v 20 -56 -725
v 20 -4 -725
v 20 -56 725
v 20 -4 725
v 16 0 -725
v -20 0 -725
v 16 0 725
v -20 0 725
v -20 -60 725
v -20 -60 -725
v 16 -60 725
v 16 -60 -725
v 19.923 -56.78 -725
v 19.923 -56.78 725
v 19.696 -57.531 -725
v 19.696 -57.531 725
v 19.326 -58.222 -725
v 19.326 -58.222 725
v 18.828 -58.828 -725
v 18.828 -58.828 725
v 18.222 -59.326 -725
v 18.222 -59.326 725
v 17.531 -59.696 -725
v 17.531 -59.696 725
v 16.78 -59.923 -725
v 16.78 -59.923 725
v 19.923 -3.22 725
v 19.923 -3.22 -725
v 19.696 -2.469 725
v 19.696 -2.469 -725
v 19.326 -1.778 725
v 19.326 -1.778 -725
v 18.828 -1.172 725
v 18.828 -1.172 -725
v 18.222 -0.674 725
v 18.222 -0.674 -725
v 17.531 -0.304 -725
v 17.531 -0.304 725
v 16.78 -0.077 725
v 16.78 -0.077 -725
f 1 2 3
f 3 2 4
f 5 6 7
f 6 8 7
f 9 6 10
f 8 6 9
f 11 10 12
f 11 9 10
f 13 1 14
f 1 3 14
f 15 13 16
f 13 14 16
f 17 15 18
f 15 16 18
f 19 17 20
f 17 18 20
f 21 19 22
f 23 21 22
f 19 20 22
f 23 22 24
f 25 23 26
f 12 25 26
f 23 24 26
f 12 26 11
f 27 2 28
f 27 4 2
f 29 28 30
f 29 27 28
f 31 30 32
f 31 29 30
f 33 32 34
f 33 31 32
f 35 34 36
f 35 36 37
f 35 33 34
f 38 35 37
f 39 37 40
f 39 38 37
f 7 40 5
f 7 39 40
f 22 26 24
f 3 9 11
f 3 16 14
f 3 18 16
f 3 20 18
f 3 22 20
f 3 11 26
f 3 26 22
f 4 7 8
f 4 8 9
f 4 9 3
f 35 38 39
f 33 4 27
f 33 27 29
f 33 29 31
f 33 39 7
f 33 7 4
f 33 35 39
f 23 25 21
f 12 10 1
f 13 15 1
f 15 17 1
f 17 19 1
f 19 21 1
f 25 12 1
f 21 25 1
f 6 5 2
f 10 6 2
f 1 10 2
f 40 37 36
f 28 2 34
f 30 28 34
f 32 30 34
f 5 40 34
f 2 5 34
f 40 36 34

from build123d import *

# Parameters (mm, degrees)
F0_W     = 40
F0_H     = 1450
F1_DEPTH = 60
F2_R     = 4
F3_R     = 4


with BuildPart() as f1:
    # F0 (on Front) → F1 (new body)
    with BuildSketch(Plane.XZ):
        Rectangle(F0_W, F0_H)
    extrude(amount=F1_DEPTH)

    # F2
    f2_edges = [f1.edges().sort_by_distance(p)[0] for p in [
        (20, -60, 0),
    ]]
    fillet(f2_edges, radius=F2_R)

    # F3
    f3_edges = [f1.edges().sort_by_distance(p)[0] for p in [
        (20, 0, 0),
    ]]
    fillet(f3_edges, radius=F3_R)


solid = f1.part
